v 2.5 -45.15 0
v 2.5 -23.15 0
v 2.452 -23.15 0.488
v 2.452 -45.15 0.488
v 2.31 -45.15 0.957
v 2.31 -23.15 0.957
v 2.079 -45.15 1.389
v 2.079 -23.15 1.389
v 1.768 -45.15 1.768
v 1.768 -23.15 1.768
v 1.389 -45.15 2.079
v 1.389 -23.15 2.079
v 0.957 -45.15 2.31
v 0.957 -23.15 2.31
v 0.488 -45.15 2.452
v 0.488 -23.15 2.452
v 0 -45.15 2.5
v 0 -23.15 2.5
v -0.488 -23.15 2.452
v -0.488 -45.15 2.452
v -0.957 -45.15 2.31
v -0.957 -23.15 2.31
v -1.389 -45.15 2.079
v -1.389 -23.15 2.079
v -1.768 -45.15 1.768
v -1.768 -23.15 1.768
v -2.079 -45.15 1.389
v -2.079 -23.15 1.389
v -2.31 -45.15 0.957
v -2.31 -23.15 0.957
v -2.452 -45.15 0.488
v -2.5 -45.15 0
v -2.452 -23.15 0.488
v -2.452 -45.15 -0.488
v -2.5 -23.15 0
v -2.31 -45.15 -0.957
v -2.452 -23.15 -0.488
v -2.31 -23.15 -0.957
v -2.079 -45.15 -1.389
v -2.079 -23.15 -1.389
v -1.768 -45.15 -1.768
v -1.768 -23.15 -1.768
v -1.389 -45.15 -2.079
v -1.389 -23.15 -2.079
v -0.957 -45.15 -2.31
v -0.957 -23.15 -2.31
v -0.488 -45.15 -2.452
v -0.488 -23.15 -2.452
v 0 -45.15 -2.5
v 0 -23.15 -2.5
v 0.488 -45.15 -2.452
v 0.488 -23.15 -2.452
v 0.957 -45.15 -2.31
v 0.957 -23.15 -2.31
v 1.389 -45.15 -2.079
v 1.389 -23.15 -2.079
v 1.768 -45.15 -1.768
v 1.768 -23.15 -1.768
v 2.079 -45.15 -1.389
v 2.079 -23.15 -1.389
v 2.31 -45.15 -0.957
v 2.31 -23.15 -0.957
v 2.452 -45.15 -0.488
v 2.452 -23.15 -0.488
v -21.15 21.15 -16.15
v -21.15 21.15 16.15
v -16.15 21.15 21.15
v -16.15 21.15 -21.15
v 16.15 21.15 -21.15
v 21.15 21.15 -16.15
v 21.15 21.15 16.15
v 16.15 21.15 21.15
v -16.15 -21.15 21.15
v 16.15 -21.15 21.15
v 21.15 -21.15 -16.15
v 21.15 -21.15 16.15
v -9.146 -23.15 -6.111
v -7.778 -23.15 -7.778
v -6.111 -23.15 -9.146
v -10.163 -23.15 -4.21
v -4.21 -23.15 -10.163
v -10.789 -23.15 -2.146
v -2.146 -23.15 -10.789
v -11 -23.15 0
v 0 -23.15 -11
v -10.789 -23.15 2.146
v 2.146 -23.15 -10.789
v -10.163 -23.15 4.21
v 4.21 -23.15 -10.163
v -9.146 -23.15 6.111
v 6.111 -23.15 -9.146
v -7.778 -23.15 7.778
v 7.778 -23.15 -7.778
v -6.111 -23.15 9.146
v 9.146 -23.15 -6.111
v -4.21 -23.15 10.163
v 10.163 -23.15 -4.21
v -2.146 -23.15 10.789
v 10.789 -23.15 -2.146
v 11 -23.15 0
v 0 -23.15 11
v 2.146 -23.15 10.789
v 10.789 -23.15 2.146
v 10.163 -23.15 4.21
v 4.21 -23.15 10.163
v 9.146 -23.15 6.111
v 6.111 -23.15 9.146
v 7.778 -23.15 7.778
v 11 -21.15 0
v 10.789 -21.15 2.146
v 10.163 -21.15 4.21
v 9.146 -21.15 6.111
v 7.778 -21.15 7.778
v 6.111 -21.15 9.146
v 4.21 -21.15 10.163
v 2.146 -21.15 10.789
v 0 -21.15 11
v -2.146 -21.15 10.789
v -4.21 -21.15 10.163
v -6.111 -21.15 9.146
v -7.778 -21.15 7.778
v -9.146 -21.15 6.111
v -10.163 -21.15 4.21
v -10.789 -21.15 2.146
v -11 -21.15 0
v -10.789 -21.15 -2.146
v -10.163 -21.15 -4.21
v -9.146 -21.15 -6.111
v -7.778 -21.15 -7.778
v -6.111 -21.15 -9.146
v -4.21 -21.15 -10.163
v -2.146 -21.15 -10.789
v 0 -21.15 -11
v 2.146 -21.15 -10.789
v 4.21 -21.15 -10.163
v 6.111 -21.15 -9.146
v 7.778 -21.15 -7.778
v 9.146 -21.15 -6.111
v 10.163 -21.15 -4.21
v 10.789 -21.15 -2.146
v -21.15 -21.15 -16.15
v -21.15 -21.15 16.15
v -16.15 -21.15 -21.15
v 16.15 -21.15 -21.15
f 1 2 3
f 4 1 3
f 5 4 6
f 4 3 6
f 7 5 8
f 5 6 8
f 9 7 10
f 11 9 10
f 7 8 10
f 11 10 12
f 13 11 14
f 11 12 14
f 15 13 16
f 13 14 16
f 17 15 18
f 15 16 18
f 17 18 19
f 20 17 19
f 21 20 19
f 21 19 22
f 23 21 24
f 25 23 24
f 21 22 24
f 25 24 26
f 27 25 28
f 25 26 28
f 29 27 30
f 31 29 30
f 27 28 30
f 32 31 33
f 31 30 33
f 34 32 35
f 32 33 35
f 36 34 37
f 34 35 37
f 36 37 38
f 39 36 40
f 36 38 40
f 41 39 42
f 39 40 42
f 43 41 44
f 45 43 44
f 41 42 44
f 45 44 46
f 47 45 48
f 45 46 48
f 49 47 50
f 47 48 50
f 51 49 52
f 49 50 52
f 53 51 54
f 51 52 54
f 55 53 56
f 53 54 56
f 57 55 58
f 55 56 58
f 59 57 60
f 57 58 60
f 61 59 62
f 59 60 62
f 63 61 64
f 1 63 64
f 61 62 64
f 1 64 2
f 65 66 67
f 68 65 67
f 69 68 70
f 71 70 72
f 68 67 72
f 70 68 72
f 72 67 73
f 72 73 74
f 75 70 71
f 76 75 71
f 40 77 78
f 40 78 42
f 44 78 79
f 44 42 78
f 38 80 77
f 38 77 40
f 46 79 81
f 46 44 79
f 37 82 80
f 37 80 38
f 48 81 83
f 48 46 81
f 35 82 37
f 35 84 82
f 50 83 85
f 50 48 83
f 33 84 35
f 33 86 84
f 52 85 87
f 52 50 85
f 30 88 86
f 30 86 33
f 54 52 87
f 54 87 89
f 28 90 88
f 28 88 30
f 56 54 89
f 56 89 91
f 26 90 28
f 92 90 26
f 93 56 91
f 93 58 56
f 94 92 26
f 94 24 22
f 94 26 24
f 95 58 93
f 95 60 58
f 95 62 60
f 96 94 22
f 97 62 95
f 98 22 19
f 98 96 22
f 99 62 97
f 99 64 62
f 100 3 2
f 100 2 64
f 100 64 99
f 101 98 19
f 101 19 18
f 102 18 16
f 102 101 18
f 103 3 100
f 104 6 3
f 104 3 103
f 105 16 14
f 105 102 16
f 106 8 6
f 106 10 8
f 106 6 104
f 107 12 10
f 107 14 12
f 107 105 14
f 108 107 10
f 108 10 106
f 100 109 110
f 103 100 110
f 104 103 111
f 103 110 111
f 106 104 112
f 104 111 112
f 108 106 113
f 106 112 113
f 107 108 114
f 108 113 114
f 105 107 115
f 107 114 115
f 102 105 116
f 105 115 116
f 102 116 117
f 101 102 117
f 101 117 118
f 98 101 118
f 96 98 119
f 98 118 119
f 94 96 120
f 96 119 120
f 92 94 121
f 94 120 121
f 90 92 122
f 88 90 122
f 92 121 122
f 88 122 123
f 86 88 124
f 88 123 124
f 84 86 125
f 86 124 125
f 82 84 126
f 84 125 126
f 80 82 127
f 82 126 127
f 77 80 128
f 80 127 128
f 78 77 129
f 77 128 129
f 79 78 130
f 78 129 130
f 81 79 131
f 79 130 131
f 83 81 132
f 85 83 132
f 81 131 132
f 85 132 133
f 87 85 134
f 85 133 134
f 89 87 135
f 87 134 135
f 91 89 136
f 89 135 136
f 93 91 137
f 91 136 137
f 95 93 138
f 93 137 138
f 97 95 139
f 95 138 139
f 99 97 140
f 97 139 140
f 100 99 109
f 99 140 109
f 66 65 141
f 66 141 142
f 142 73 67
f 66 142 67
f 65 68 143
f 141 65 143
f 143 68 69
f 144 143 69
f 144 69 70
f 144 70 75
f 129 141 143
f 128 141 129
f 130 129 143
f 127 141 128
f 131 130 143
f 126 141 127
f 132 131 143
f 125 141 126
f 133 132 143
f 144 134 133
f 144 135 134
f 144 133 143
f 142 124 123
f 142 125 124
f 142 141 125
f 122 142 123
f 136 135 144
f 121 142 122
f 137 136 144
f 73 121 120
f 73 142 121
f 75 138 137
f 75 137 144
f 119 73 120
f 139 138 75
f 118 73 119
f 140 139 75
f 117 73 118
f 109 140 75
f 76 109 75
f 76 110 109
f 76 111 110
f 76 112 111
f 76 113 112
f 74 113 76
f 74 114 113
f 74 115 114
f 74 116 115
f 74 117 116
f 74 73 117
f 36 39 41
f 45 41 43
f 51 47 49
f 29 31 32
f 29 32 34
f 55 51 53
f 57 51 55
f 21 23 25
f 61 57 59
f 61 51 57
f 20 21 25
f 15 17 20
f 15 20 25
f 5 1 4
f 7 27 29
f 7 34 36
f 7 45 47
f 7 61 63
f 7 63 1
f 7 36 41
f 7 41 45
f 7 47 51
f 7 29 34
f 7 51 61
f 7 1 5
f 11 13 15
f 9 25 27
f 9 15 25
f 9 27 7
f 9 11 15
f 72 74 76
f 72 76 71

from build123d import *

# Parameters (mm, degrees)
F0_W     = 42.3
F0_H     = 42.3
F1_DEPTH = 21.15
F2_SIZE  = 5
F3_R     = 11
F4_DEPTH = 2
F5_R     = 2.5
F6_DEPTH = 22


with BuildPart() as f1:
    # F0 (on Front) → F1 (new body, symmetric)
    with BuildSketch(Plane.XZ):
        Rectangle(F0_W, F0_H)
    extrude(amount=F1_DEPTH, both=True)

    # F2
    f2_edges = [f1.edges().sort_by_distance(p)[0] for p in [
        (-21.15, 0, 21.15),
        (21.15, 0, 21.15),
        (-21.15, 0, -21.15),
        (21.15, 0, -21.15),
    ]]
    chamfer(f2_edges, length=F2_SIZE)

    # F3 (on face) → F4 (join)
    with BuildSketch(Plane.XZ.offset(21.15)):
        Circle(F3_R)
    extrude(amount=F4_DEPTH)

    # F5 (on face) → F6 (join)
    with BuildSketch(Plane.XZ.offset(23.15)):
        Circle(F5_R)
    extrude(amount=F6_DEPTH)


solid = f1.part
